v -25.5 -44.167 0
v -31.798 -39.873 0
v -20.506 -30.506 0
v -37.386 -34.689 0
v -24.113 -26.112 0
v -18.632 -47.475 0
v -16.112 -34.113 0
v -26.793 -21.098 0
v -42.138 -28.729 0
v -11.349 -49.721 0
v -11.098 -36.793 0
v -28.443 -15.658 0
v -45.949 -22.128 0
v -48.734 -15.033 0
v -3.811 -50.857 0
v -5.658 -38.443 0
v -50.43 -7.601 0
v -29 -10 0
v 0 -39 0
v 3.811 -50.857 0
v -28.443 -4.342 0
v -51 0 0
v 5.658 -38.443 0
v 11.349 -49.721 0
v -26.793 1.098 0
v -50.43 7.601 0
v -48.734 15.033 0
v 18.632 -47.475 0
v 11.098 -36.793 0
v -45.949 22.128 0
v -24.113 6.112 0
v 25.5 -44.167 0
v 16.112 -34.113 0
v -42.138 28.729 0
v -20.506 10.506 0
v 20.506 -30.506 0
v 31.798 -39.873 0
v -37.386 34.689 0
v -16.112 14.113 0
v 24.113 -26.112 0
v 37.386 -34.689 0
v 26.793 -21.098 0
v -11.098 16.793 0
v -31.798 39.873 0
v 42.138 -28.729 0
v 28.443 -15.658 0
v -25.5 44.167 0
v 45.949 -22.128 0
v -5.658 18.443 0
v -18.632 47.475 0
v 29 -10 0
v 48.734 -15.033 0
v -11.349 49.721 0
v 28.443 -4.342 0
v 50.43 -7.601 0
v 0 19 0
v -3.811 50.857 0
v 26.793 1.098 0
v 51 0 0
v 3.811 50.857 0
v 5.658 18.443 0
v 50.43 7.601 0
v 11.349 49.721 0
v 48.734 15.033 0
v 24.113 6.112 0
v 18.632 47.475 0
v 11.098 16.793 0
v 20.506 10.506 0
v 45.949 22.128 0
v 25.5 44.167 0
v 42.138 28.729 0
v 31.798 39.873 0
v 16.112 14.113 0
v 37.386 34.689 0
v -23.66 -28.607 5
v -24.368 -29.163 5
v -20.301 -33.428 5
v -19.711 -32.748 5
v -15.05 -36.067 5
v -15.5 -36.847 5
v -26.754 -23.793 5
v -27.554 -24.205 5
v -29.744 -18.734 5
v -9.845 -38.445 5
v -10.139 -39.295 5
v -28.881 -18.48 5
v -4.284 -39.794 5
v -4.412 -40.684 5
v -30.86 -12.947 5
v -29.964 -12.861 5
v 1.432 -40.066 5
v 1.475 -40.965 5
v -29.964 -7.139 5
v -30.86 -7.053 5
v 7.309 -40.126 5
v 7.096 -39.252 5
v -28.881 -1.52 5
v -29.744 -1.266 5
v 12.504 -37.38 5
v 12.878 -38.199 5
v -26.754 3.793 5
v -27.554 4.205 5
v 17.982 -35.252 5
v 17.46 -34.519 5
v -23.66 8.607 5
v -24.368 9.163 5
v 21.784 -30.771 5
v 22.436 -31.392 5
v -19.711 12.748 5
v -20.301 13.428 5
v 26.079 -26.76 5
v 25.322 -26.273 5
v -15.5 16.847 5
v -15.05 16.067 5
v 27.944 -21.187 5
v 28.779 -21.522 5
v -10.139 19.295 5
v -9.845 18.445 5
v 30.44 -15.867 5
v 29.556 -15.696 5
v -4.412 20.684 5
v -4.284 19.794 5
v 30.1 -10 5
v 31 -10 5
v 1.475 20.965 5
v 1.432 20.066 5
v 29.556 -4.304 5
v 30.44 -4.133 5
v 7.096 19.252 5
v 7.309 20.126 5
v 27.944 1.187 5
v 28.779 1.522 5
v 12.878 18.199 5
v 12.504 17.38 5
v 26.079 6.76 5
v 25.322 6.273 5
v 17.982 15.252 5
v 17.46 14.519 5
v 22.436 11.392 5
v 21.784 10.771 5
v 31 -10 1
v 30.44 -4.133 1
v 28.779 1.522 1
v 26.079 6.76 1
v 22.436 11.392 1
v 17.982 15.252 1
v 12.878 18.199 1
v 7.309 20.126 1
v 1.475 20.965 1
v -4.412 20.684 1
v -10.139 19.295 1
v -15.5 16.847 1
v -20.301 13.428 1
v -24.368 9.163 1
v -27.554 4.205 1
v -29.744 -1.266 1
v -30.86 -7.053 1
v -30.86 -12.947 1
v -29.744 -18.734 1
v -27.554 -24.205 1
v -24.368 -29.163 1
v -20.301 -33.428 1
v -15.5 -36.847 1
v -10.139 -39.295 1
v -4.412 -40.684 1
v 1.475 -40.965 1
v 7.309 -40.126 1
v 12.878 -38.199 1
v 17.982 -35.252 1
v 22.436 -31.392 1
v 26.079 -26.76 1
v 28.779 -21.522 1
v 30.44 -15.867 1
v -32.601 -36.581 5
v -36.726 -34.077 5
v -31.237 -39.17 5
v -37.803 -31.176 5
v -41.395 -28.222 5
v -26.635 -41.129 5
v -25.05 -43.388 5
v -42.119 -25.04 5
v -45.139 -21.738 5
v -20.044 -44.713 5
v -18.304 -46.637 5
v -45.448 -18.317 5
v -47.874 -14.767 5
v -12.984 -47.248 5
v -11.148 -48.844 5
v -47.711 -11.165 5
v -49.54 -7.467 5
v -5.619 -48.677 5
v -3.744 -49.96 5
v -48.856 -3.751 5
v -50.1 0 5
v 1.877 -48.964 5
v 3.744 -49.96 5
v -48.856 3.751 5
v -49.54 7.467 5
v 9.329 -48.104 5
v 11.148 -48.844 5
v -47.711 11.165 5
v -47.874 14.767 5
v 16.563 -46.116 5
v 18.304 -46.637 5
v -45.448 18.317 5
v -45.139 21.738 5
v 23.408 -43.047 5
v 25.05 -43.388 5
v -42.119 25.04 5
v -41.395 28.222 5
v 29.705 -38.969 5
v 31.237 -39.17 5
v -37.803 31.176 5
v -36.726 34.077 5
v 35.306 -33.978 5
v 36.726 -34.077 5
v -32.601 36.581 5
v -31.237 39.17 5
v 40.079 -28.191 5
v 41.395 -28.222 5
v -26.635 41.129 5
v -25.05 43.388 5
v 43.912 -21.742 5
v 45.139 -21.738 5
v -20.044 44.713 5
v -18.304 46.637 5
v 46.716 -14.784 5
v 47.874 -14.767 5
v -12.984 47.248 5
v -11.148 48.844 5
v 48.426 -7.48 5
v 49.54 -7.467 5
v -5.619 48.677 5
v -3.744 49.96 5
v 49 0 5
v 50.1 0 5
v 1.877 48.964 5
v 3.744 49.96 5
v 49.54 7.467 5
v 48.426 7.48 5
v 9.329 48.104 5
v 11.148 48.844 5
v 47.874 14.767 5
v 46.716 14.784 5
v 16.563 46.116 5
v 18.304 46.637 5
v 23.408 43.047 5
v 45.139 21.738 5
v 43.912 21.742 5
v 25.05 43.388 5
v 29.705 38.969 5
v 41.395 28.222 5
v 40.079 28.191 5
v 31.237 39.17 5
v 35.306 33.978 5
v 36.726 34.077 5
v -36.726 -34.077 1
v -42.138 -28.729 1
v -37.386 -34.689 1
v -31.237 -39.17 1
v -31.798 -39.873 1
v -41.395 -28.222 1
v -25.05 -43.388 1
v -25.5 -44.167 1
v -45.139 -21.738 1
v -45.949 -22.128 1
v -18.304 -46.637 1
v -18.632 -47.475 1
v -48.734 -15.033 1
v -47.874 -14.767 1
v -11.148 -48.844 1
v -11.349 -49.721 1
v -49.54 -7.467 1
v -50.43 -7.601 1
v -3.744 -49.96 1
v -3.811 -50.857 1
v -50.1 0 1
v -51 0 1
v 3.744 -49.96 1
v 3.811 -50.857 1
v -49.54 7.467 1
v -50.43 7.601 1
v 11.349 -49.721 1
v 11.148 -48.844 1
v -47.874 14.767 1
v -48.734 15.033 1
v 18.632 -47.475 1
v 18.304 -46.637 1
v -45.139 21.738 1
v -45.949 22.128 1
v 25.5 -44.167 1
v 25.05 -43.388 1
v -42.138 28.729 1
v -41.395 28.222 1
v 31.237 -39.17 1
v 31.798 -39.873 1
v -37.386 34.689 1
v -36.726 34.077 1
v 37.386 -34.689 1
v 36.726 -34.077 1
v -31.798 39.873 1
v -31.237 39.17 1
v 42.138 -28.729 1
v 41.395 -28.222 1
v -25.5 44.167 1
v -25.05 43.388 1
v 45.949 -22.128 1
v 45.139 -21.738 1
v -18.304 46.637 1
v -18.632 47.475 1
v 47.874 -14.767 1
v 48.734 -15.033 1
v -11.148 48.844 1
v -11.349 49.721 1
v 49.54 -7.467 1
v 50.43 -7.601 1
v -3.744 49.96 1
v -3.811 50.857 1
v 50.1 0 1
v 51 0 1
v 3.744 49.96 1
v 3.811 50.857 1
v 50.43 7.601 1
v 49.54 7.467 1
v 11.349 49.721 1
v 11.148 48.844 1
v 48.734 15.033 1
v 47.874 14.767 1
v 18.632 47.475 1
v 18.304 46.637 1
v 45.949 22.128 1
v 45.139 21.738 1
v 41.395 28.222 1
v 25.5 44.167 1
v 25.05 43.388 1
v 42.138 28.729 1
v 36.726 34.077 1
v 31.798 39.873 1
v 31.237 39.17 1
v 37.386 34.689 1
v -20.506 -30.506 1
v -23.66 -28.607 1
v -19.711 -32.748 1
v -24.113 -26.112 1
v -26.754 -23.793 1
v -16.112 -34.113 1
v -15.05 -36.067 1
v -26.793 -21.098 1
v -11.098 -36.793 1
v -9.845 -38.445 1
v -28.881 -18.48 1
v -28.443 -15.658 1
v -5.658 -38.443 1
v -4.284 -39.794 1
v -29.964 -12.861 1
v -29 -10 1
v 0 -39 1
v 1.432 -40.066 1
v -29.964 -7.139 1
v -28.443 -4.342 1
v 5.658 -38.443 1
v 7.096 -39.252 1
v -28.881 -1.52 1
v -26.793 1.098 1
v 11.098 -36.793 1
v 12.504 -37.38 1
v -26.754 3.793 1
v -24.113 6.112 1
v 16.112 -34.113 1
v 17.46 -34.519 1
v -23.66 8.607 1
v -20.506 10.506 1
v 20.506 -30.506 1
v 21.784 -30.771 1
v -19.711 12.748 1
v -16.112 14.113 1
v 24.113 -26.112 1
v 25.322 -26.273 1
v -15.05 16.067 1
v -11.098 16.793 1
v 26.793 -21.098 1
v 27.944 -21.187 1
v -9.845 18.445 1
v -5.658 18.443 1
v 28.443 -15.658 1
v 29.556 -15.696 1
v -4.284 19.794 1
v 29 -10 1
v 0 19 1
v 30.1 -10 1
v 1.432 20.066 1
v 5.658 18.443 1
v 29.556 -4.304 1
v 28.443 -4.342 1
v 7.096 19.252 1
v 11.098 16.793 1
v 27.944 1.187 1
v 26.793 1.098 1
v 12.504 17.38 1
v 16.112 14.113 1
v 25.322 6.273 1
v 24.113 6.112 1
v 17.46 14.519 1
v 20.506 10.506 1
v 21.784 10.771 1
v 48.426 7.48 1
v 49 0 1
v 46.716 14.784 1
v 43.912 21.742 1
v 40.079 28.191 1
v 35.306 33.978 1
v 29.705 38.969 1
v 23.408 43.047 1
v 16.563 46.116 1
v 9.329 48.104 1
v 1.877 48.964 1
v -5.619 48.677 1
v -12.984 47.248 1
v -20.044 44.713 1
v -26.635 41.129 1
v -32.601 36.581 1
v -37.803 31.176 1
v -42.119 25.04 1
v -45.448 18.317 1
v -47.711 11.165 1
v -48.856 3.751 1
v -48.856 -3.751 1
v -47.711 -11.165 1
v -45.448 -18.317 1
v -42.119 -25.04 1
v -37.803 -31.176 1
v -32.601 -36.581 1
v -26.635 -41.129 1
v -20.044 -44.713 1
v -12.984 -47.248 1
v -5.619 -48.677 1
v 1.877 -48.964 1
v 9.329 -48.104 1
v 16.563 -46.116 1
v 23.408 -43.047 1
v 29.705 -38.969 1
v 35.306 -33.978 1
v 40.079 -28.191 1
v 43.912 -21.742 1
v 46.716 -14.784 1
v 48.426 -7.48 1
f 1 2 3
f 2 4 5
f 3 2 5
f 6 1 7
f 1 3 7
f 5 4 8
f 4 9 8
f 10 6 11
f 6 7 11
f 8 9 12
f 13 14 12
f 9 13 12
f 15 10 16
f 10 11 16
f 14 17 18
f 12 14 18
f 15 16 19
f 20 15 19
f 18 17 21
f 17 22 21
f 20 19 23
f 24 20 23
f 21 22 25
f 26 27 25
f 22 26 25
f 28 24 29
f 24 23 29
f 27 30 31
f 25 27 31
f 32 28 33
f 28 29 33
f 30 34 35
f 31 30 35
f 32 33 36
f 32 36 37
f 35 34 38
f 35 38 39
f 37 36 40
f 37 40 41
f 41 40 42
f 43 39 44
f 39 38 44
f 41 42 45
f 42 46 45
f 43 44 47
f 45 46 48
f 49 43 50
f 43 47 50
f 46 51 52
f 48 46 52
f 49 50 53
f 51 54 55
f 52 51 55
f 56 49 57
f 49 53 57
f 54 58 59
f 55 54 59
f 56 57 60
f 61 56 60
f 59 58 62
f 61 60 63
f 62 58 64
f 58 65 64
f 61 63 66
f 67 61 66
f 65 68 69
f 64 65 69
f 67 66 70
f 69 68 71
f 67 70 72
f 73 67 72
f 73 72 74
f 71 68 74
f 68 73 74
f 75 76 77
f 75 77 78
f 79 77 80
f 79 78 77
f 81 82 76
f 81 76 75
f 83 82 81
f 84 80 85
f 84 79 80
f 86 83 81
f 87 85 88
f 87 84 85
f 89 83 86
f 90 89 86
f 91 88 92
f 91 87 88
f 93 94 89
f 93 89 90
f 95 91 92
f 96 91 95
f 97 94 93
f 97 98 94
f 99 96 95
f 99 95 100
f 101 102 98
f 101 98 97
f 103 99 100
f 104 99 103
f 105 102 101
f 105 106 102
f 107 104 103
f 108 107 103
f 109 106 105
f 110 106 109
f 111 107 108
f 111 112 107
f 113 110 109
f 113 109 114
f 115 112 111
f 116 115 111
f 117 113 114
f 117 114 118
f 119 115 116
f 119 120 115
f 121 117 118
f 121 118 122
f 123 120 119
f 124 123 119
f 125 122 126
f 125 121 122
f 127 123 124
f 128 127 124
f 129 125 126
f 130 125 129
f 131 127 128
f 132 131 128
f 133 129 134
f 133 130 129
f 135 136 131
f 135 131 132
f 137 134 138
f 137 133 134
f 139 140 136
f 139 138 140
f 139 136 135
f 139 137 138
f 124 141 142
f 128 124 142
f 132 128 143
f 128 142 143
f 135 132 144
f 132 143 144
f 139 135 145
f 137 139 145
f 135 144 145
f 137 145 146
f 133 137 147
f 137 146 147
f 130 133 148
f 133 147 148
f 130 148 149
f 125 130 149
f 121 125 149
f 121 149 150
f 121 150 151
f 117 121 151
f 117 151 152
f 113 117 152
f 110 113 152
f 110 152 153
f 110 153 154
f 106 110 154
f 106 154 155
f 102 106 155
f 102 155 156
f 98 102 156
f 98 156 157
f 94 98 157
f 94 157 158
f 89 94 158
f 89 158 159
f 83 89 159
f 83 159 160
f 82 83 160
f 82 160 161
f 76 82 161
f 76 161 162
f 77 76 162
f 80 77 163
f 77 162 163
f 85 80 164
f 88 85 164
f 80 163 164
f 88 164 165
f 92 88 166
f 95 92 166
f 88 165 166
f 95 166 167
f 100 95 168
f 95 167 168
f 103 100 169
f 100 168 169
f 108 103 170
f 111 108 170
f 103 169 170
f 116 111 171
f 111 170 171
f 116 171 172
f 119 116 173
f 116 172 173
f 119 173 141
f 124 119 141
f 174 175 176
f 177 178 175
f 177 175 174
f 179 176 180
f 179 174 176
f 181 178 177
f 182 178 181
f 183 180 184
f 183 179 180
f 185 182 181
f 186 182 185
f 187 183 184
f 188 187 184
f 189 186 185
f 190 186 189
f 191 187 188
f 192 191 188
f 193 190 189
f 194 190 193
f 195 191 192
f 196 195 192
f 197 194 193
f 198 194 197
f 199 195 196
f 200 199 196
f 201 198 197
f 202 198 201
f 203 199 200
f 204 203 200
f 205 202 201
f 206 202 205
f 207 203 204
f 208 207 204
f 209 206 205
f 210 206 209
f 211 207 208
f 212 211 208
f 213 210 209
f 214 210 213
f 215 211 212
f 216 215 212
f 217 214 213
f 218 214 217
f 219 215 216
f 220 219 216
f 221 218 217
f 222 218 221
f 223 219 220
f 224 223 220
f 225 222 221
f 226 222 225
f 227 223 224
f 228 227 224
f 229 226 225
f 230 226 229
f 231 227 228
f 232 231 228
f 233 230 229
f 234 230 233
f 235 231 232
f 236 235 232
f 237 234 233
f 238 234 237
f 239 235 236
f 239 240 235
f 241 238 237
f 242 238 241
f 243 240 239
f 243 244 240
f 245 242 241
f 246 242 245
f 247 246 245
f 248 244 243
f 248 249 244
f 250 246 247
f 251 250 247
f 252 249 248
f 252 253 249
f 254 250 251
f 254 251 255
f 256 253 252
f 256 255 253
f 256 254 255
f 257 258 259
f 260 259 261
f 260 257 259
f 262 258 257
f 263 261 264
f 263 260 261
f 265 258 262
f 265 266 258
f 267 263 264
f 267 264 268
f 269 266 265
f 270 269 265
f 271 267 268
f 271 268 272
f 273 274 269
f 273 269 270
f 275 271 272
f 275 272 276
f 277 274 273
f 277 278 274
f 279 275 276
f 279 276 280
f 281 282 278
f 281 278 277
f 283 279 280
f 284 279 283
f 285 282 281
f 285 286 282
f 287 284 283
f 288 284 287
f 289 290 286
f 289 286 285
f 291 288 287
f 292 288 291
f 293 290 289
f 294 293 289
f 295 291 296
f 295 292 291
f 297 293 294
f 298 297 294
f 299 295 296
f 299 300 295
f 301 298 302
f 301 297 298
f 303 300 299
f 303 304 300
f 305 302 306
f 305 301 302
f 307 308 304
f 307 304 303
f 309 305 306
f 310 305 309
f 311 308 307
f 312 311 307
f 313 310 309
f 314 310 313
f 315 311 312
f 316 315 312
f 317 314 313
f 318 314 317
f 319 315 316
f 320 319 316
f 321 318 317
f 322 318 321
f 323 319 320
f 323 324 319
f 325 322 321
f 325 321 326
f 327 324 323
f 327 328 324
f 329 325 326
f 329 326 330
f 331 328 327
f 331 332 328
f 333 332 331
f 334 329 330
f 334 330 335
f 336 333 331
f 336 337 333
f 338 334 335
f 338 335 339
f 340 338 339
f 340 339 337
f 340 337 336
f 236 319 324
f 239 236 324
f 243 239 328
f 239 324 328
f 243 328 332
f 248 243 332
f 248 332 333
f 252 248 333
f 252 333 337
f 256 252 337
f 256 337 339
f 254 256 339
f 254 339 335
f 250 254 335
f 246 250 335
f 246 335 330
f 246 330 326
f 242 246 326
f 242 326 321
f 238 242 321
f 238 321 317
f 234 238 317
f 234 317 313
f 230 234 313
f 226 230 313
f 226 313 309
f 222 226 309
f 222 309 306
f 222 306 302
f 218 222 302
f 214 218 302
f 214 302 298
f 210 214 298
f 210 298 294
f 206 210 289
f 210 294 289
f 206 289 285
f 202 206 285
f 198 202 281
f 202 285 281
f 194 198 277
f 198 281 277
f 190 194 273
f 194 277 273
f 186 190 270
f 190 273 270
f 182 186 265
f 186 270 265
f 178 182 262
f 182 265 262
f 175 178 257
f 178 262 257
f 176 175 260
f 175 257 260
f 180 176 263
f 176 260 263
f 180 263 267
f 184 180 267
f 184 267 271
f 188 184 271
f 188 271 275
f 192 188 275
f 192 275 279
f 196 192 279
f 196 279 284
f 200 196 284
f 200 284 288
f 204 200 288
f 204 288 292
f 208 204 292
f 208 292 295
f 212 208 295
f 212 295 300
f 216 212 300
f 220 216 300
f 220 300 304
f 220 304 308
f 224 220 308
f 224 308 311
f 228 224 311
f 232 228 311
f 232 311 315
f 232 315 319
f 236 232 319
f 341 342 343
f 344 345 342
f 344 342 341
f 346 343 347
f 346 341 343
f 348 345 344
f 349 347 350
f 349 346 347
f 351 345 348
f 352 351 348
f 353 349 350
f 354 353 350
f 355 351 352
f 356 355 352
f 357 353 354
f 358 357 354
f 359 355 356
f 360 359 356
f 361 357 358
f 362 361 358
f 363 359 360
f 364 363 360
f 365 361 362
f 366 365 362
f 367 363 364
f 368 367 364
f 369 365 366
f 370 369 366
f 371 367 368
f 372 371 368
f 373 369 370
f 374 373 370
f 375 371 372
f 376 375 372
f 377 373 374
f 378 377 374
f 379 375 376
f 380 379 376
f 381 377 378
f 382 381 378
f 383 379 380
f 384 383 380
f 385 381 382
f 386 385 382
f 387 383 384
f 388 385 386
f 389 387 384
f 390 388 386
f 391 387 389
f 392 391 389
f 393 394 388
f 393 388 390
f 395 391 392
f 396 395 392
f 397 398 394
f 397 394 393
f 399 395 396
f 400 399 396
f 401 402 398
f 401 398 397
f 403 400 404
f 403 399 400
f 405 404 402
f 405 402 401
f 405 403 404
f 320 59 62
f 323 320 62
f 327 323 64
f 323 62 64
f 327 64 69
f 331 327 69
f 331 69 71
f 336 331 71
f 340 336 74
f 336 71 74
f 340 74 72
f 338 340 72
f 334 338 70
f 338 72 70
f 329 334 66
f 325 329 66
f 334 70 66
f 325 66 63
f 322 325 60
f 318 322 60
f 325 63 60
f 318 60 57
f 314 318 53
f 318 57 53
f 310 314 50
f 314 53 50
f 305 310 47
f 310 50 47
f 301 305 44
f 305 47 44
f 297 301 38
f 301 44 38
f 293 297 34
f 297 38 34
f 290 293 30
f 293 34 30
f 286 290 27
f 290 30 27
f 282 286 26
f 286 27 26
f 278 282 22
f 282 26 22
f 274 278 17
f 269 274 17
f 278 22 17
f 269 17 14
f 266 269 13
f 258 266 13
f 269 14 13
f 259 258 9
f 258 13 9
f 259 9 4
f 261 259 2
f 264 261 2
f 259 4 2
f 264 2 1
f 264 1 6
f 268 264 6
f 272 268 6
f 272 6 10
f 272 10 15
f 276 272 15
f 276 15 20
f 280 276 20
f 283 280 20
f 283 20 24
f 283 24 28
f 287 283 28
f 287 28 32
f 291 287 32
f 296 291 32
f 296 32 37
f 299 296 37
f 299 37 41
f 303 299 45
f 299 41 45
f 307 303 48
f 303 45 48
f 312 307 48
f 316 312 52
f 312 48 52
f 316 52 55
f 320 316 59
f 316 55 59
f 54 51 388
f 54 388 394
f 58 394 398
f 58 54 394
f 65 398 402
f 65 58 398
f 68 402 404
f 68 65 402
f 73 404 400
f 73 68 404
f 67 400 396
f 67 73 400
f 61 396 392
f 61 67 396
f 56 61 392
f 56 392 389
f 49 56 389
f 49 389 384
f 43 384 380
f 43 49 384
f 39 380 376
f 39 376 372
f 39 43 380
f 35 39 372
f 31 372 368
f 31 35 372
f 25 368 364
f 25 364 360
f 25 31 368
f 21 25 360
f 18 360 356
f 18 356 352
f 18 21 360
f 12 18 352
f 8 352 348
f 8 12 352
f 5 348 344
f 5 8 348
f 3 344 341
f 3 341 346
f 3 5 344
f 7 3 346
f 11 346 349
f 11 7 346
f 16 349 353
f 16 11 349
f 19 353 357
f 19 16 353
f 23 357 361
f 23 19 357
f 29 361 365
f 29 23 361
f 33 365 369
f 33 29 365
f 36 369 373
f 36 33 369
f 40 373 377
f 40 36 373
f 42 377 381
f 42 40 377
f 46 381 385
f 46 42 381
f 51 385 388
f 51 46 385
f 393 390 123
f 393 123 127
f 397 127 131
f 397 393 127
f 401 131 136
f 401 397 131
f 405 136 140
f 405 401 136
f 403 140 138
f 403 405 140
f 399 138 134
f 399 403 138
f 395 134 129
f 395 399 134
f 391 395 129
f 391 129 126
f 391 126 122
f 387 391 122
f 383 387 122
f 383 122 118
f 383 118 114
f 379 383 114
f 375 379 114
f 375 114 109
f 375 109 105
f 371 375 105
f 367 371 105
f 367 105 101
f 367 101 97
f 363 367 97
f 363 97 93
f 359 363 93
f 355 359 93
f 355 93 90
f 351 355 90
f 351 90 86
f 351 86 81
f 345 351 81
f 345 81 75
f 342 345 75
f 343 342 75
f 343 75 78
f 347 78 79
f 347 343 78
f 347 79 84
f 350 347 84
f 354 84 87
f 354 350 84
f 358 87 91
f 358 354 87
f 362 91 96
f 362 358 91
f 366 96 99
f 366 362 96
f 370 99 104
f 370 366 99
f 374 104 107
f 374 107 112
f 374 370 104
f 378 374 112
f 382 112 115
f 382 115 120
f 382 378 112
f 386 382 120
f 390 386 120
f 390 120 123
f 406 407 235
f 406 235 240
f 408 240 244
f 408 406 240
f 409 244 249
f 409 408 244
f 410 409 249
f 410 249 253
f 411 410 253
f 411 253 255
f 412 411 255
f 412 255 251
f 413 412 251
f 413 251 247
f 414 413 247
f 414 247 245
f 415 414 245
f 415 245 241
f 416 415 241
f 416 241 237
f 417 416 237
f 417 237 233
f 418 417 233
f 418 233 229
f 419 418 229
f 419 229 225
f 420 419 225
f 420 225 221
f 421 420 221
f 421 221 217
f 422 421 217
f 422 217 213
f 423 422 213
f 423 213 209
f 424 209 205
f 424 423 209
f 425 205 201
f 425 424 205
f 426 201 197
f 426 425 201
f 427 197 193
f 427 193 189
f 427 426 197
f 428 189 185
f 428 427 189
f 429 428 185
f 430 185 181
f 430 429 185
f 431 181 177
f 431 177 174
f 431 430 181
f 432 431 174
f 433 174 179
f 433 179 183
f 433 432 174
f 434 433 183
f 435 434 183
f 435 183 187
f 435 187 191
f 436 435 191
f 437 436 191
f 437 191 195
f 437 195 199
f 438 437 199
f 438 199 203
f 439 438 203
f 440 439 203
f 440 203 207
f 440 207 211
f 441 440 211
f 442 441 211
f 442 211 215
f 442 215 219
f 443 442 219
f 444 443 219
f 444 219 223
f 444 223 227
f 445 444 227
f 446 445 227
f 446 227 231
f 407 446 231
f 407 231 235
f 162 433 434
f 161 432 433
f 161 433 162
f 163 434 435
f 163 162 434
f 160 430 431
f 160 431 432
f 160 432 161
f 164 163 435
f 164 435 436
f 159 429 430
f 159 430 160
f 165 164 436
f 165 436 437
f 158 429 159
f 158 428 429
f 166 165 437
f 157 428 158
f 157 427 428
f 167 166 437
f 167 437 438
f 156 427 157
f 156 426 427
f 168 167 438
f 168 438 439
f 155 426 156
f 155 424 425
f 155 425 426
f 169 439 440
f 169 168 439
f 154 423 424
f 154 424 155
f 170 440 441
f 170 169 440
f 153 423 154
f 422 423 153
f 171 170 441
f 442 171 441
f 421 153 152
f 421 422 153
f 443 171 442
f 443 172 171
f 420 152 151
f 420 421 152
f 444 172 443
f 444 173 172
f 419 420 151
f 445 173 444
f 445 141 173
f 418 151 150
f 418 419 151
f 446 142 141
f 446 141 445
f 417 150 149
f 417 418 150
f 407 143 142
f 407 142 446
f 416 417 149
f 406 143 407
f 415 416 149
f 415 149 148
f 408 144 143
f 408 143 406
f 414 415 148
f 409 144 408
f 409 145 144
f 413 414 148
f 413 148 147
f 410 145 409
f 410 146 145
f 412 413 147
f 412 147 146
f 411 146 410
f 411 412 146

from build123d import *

# Parameters (mm, degrees)
F0_R     = 51
F0_R_2   = 50.1
F1_DEPTH = 1
F0_R_3   = 30.1
F0_R_4   = 29
F0_R_5   = 49
F0_R_6   = 31
F2_DEPTH = 5


with BuildPart() as f1:
    # F0 (on Top) → F1 (new body)
    with BuildSketch(Plane.XY):
        Circle(F0_R)
        Circle(F0_R_2, mode=Mode.SUBTRACT)
    extrude(amount=F1_DEPTH)



with BuildPart() as f1b:
    # F0 (on Top) → F1, piece 2 (new body)
    with BuildSketch(Plane.XY):
        with Locations((0, -10)):
            Circle(F0_R_3)
        with Locations((0, -10)):
            Circle(F0_R_4, mode=Mode.SUBTRACT)
    extrude(amount=F1_DEPTH)


with BuildPart() as f1c:
    # F0 (on Top) → F1, piece 3 (new body)
    with BuildSketch(Plane.XY):
        Circle(F0_R_5)
        with Locations((0, -10)):
            Circle(F0_R_6, mode=Mode.SUBTRACT)
    extrude(amount=F1_DEPTH)


with BuildPart() as f1_1:
    add(f1.part)

    add(f1b.part)  # F2 merges F1b

    add(f1c.part)  # F2 merges F1c
    # F0 (on Top) → F2 (join)
    with BuildSketch(Plane.XY):
        Circle(F0_R_2)
        Circle(F0_R_5, mode=Mode.SUBTRACT)
        with Locations((0, -10)):
            Circle(F0_R_6)
        with Locations((0, -10)):
            Circle(F0_R_3, mode=Mode.SUBTRACT)
    extrude(amount=F2_DEPTH)


solid = f1_1.part
